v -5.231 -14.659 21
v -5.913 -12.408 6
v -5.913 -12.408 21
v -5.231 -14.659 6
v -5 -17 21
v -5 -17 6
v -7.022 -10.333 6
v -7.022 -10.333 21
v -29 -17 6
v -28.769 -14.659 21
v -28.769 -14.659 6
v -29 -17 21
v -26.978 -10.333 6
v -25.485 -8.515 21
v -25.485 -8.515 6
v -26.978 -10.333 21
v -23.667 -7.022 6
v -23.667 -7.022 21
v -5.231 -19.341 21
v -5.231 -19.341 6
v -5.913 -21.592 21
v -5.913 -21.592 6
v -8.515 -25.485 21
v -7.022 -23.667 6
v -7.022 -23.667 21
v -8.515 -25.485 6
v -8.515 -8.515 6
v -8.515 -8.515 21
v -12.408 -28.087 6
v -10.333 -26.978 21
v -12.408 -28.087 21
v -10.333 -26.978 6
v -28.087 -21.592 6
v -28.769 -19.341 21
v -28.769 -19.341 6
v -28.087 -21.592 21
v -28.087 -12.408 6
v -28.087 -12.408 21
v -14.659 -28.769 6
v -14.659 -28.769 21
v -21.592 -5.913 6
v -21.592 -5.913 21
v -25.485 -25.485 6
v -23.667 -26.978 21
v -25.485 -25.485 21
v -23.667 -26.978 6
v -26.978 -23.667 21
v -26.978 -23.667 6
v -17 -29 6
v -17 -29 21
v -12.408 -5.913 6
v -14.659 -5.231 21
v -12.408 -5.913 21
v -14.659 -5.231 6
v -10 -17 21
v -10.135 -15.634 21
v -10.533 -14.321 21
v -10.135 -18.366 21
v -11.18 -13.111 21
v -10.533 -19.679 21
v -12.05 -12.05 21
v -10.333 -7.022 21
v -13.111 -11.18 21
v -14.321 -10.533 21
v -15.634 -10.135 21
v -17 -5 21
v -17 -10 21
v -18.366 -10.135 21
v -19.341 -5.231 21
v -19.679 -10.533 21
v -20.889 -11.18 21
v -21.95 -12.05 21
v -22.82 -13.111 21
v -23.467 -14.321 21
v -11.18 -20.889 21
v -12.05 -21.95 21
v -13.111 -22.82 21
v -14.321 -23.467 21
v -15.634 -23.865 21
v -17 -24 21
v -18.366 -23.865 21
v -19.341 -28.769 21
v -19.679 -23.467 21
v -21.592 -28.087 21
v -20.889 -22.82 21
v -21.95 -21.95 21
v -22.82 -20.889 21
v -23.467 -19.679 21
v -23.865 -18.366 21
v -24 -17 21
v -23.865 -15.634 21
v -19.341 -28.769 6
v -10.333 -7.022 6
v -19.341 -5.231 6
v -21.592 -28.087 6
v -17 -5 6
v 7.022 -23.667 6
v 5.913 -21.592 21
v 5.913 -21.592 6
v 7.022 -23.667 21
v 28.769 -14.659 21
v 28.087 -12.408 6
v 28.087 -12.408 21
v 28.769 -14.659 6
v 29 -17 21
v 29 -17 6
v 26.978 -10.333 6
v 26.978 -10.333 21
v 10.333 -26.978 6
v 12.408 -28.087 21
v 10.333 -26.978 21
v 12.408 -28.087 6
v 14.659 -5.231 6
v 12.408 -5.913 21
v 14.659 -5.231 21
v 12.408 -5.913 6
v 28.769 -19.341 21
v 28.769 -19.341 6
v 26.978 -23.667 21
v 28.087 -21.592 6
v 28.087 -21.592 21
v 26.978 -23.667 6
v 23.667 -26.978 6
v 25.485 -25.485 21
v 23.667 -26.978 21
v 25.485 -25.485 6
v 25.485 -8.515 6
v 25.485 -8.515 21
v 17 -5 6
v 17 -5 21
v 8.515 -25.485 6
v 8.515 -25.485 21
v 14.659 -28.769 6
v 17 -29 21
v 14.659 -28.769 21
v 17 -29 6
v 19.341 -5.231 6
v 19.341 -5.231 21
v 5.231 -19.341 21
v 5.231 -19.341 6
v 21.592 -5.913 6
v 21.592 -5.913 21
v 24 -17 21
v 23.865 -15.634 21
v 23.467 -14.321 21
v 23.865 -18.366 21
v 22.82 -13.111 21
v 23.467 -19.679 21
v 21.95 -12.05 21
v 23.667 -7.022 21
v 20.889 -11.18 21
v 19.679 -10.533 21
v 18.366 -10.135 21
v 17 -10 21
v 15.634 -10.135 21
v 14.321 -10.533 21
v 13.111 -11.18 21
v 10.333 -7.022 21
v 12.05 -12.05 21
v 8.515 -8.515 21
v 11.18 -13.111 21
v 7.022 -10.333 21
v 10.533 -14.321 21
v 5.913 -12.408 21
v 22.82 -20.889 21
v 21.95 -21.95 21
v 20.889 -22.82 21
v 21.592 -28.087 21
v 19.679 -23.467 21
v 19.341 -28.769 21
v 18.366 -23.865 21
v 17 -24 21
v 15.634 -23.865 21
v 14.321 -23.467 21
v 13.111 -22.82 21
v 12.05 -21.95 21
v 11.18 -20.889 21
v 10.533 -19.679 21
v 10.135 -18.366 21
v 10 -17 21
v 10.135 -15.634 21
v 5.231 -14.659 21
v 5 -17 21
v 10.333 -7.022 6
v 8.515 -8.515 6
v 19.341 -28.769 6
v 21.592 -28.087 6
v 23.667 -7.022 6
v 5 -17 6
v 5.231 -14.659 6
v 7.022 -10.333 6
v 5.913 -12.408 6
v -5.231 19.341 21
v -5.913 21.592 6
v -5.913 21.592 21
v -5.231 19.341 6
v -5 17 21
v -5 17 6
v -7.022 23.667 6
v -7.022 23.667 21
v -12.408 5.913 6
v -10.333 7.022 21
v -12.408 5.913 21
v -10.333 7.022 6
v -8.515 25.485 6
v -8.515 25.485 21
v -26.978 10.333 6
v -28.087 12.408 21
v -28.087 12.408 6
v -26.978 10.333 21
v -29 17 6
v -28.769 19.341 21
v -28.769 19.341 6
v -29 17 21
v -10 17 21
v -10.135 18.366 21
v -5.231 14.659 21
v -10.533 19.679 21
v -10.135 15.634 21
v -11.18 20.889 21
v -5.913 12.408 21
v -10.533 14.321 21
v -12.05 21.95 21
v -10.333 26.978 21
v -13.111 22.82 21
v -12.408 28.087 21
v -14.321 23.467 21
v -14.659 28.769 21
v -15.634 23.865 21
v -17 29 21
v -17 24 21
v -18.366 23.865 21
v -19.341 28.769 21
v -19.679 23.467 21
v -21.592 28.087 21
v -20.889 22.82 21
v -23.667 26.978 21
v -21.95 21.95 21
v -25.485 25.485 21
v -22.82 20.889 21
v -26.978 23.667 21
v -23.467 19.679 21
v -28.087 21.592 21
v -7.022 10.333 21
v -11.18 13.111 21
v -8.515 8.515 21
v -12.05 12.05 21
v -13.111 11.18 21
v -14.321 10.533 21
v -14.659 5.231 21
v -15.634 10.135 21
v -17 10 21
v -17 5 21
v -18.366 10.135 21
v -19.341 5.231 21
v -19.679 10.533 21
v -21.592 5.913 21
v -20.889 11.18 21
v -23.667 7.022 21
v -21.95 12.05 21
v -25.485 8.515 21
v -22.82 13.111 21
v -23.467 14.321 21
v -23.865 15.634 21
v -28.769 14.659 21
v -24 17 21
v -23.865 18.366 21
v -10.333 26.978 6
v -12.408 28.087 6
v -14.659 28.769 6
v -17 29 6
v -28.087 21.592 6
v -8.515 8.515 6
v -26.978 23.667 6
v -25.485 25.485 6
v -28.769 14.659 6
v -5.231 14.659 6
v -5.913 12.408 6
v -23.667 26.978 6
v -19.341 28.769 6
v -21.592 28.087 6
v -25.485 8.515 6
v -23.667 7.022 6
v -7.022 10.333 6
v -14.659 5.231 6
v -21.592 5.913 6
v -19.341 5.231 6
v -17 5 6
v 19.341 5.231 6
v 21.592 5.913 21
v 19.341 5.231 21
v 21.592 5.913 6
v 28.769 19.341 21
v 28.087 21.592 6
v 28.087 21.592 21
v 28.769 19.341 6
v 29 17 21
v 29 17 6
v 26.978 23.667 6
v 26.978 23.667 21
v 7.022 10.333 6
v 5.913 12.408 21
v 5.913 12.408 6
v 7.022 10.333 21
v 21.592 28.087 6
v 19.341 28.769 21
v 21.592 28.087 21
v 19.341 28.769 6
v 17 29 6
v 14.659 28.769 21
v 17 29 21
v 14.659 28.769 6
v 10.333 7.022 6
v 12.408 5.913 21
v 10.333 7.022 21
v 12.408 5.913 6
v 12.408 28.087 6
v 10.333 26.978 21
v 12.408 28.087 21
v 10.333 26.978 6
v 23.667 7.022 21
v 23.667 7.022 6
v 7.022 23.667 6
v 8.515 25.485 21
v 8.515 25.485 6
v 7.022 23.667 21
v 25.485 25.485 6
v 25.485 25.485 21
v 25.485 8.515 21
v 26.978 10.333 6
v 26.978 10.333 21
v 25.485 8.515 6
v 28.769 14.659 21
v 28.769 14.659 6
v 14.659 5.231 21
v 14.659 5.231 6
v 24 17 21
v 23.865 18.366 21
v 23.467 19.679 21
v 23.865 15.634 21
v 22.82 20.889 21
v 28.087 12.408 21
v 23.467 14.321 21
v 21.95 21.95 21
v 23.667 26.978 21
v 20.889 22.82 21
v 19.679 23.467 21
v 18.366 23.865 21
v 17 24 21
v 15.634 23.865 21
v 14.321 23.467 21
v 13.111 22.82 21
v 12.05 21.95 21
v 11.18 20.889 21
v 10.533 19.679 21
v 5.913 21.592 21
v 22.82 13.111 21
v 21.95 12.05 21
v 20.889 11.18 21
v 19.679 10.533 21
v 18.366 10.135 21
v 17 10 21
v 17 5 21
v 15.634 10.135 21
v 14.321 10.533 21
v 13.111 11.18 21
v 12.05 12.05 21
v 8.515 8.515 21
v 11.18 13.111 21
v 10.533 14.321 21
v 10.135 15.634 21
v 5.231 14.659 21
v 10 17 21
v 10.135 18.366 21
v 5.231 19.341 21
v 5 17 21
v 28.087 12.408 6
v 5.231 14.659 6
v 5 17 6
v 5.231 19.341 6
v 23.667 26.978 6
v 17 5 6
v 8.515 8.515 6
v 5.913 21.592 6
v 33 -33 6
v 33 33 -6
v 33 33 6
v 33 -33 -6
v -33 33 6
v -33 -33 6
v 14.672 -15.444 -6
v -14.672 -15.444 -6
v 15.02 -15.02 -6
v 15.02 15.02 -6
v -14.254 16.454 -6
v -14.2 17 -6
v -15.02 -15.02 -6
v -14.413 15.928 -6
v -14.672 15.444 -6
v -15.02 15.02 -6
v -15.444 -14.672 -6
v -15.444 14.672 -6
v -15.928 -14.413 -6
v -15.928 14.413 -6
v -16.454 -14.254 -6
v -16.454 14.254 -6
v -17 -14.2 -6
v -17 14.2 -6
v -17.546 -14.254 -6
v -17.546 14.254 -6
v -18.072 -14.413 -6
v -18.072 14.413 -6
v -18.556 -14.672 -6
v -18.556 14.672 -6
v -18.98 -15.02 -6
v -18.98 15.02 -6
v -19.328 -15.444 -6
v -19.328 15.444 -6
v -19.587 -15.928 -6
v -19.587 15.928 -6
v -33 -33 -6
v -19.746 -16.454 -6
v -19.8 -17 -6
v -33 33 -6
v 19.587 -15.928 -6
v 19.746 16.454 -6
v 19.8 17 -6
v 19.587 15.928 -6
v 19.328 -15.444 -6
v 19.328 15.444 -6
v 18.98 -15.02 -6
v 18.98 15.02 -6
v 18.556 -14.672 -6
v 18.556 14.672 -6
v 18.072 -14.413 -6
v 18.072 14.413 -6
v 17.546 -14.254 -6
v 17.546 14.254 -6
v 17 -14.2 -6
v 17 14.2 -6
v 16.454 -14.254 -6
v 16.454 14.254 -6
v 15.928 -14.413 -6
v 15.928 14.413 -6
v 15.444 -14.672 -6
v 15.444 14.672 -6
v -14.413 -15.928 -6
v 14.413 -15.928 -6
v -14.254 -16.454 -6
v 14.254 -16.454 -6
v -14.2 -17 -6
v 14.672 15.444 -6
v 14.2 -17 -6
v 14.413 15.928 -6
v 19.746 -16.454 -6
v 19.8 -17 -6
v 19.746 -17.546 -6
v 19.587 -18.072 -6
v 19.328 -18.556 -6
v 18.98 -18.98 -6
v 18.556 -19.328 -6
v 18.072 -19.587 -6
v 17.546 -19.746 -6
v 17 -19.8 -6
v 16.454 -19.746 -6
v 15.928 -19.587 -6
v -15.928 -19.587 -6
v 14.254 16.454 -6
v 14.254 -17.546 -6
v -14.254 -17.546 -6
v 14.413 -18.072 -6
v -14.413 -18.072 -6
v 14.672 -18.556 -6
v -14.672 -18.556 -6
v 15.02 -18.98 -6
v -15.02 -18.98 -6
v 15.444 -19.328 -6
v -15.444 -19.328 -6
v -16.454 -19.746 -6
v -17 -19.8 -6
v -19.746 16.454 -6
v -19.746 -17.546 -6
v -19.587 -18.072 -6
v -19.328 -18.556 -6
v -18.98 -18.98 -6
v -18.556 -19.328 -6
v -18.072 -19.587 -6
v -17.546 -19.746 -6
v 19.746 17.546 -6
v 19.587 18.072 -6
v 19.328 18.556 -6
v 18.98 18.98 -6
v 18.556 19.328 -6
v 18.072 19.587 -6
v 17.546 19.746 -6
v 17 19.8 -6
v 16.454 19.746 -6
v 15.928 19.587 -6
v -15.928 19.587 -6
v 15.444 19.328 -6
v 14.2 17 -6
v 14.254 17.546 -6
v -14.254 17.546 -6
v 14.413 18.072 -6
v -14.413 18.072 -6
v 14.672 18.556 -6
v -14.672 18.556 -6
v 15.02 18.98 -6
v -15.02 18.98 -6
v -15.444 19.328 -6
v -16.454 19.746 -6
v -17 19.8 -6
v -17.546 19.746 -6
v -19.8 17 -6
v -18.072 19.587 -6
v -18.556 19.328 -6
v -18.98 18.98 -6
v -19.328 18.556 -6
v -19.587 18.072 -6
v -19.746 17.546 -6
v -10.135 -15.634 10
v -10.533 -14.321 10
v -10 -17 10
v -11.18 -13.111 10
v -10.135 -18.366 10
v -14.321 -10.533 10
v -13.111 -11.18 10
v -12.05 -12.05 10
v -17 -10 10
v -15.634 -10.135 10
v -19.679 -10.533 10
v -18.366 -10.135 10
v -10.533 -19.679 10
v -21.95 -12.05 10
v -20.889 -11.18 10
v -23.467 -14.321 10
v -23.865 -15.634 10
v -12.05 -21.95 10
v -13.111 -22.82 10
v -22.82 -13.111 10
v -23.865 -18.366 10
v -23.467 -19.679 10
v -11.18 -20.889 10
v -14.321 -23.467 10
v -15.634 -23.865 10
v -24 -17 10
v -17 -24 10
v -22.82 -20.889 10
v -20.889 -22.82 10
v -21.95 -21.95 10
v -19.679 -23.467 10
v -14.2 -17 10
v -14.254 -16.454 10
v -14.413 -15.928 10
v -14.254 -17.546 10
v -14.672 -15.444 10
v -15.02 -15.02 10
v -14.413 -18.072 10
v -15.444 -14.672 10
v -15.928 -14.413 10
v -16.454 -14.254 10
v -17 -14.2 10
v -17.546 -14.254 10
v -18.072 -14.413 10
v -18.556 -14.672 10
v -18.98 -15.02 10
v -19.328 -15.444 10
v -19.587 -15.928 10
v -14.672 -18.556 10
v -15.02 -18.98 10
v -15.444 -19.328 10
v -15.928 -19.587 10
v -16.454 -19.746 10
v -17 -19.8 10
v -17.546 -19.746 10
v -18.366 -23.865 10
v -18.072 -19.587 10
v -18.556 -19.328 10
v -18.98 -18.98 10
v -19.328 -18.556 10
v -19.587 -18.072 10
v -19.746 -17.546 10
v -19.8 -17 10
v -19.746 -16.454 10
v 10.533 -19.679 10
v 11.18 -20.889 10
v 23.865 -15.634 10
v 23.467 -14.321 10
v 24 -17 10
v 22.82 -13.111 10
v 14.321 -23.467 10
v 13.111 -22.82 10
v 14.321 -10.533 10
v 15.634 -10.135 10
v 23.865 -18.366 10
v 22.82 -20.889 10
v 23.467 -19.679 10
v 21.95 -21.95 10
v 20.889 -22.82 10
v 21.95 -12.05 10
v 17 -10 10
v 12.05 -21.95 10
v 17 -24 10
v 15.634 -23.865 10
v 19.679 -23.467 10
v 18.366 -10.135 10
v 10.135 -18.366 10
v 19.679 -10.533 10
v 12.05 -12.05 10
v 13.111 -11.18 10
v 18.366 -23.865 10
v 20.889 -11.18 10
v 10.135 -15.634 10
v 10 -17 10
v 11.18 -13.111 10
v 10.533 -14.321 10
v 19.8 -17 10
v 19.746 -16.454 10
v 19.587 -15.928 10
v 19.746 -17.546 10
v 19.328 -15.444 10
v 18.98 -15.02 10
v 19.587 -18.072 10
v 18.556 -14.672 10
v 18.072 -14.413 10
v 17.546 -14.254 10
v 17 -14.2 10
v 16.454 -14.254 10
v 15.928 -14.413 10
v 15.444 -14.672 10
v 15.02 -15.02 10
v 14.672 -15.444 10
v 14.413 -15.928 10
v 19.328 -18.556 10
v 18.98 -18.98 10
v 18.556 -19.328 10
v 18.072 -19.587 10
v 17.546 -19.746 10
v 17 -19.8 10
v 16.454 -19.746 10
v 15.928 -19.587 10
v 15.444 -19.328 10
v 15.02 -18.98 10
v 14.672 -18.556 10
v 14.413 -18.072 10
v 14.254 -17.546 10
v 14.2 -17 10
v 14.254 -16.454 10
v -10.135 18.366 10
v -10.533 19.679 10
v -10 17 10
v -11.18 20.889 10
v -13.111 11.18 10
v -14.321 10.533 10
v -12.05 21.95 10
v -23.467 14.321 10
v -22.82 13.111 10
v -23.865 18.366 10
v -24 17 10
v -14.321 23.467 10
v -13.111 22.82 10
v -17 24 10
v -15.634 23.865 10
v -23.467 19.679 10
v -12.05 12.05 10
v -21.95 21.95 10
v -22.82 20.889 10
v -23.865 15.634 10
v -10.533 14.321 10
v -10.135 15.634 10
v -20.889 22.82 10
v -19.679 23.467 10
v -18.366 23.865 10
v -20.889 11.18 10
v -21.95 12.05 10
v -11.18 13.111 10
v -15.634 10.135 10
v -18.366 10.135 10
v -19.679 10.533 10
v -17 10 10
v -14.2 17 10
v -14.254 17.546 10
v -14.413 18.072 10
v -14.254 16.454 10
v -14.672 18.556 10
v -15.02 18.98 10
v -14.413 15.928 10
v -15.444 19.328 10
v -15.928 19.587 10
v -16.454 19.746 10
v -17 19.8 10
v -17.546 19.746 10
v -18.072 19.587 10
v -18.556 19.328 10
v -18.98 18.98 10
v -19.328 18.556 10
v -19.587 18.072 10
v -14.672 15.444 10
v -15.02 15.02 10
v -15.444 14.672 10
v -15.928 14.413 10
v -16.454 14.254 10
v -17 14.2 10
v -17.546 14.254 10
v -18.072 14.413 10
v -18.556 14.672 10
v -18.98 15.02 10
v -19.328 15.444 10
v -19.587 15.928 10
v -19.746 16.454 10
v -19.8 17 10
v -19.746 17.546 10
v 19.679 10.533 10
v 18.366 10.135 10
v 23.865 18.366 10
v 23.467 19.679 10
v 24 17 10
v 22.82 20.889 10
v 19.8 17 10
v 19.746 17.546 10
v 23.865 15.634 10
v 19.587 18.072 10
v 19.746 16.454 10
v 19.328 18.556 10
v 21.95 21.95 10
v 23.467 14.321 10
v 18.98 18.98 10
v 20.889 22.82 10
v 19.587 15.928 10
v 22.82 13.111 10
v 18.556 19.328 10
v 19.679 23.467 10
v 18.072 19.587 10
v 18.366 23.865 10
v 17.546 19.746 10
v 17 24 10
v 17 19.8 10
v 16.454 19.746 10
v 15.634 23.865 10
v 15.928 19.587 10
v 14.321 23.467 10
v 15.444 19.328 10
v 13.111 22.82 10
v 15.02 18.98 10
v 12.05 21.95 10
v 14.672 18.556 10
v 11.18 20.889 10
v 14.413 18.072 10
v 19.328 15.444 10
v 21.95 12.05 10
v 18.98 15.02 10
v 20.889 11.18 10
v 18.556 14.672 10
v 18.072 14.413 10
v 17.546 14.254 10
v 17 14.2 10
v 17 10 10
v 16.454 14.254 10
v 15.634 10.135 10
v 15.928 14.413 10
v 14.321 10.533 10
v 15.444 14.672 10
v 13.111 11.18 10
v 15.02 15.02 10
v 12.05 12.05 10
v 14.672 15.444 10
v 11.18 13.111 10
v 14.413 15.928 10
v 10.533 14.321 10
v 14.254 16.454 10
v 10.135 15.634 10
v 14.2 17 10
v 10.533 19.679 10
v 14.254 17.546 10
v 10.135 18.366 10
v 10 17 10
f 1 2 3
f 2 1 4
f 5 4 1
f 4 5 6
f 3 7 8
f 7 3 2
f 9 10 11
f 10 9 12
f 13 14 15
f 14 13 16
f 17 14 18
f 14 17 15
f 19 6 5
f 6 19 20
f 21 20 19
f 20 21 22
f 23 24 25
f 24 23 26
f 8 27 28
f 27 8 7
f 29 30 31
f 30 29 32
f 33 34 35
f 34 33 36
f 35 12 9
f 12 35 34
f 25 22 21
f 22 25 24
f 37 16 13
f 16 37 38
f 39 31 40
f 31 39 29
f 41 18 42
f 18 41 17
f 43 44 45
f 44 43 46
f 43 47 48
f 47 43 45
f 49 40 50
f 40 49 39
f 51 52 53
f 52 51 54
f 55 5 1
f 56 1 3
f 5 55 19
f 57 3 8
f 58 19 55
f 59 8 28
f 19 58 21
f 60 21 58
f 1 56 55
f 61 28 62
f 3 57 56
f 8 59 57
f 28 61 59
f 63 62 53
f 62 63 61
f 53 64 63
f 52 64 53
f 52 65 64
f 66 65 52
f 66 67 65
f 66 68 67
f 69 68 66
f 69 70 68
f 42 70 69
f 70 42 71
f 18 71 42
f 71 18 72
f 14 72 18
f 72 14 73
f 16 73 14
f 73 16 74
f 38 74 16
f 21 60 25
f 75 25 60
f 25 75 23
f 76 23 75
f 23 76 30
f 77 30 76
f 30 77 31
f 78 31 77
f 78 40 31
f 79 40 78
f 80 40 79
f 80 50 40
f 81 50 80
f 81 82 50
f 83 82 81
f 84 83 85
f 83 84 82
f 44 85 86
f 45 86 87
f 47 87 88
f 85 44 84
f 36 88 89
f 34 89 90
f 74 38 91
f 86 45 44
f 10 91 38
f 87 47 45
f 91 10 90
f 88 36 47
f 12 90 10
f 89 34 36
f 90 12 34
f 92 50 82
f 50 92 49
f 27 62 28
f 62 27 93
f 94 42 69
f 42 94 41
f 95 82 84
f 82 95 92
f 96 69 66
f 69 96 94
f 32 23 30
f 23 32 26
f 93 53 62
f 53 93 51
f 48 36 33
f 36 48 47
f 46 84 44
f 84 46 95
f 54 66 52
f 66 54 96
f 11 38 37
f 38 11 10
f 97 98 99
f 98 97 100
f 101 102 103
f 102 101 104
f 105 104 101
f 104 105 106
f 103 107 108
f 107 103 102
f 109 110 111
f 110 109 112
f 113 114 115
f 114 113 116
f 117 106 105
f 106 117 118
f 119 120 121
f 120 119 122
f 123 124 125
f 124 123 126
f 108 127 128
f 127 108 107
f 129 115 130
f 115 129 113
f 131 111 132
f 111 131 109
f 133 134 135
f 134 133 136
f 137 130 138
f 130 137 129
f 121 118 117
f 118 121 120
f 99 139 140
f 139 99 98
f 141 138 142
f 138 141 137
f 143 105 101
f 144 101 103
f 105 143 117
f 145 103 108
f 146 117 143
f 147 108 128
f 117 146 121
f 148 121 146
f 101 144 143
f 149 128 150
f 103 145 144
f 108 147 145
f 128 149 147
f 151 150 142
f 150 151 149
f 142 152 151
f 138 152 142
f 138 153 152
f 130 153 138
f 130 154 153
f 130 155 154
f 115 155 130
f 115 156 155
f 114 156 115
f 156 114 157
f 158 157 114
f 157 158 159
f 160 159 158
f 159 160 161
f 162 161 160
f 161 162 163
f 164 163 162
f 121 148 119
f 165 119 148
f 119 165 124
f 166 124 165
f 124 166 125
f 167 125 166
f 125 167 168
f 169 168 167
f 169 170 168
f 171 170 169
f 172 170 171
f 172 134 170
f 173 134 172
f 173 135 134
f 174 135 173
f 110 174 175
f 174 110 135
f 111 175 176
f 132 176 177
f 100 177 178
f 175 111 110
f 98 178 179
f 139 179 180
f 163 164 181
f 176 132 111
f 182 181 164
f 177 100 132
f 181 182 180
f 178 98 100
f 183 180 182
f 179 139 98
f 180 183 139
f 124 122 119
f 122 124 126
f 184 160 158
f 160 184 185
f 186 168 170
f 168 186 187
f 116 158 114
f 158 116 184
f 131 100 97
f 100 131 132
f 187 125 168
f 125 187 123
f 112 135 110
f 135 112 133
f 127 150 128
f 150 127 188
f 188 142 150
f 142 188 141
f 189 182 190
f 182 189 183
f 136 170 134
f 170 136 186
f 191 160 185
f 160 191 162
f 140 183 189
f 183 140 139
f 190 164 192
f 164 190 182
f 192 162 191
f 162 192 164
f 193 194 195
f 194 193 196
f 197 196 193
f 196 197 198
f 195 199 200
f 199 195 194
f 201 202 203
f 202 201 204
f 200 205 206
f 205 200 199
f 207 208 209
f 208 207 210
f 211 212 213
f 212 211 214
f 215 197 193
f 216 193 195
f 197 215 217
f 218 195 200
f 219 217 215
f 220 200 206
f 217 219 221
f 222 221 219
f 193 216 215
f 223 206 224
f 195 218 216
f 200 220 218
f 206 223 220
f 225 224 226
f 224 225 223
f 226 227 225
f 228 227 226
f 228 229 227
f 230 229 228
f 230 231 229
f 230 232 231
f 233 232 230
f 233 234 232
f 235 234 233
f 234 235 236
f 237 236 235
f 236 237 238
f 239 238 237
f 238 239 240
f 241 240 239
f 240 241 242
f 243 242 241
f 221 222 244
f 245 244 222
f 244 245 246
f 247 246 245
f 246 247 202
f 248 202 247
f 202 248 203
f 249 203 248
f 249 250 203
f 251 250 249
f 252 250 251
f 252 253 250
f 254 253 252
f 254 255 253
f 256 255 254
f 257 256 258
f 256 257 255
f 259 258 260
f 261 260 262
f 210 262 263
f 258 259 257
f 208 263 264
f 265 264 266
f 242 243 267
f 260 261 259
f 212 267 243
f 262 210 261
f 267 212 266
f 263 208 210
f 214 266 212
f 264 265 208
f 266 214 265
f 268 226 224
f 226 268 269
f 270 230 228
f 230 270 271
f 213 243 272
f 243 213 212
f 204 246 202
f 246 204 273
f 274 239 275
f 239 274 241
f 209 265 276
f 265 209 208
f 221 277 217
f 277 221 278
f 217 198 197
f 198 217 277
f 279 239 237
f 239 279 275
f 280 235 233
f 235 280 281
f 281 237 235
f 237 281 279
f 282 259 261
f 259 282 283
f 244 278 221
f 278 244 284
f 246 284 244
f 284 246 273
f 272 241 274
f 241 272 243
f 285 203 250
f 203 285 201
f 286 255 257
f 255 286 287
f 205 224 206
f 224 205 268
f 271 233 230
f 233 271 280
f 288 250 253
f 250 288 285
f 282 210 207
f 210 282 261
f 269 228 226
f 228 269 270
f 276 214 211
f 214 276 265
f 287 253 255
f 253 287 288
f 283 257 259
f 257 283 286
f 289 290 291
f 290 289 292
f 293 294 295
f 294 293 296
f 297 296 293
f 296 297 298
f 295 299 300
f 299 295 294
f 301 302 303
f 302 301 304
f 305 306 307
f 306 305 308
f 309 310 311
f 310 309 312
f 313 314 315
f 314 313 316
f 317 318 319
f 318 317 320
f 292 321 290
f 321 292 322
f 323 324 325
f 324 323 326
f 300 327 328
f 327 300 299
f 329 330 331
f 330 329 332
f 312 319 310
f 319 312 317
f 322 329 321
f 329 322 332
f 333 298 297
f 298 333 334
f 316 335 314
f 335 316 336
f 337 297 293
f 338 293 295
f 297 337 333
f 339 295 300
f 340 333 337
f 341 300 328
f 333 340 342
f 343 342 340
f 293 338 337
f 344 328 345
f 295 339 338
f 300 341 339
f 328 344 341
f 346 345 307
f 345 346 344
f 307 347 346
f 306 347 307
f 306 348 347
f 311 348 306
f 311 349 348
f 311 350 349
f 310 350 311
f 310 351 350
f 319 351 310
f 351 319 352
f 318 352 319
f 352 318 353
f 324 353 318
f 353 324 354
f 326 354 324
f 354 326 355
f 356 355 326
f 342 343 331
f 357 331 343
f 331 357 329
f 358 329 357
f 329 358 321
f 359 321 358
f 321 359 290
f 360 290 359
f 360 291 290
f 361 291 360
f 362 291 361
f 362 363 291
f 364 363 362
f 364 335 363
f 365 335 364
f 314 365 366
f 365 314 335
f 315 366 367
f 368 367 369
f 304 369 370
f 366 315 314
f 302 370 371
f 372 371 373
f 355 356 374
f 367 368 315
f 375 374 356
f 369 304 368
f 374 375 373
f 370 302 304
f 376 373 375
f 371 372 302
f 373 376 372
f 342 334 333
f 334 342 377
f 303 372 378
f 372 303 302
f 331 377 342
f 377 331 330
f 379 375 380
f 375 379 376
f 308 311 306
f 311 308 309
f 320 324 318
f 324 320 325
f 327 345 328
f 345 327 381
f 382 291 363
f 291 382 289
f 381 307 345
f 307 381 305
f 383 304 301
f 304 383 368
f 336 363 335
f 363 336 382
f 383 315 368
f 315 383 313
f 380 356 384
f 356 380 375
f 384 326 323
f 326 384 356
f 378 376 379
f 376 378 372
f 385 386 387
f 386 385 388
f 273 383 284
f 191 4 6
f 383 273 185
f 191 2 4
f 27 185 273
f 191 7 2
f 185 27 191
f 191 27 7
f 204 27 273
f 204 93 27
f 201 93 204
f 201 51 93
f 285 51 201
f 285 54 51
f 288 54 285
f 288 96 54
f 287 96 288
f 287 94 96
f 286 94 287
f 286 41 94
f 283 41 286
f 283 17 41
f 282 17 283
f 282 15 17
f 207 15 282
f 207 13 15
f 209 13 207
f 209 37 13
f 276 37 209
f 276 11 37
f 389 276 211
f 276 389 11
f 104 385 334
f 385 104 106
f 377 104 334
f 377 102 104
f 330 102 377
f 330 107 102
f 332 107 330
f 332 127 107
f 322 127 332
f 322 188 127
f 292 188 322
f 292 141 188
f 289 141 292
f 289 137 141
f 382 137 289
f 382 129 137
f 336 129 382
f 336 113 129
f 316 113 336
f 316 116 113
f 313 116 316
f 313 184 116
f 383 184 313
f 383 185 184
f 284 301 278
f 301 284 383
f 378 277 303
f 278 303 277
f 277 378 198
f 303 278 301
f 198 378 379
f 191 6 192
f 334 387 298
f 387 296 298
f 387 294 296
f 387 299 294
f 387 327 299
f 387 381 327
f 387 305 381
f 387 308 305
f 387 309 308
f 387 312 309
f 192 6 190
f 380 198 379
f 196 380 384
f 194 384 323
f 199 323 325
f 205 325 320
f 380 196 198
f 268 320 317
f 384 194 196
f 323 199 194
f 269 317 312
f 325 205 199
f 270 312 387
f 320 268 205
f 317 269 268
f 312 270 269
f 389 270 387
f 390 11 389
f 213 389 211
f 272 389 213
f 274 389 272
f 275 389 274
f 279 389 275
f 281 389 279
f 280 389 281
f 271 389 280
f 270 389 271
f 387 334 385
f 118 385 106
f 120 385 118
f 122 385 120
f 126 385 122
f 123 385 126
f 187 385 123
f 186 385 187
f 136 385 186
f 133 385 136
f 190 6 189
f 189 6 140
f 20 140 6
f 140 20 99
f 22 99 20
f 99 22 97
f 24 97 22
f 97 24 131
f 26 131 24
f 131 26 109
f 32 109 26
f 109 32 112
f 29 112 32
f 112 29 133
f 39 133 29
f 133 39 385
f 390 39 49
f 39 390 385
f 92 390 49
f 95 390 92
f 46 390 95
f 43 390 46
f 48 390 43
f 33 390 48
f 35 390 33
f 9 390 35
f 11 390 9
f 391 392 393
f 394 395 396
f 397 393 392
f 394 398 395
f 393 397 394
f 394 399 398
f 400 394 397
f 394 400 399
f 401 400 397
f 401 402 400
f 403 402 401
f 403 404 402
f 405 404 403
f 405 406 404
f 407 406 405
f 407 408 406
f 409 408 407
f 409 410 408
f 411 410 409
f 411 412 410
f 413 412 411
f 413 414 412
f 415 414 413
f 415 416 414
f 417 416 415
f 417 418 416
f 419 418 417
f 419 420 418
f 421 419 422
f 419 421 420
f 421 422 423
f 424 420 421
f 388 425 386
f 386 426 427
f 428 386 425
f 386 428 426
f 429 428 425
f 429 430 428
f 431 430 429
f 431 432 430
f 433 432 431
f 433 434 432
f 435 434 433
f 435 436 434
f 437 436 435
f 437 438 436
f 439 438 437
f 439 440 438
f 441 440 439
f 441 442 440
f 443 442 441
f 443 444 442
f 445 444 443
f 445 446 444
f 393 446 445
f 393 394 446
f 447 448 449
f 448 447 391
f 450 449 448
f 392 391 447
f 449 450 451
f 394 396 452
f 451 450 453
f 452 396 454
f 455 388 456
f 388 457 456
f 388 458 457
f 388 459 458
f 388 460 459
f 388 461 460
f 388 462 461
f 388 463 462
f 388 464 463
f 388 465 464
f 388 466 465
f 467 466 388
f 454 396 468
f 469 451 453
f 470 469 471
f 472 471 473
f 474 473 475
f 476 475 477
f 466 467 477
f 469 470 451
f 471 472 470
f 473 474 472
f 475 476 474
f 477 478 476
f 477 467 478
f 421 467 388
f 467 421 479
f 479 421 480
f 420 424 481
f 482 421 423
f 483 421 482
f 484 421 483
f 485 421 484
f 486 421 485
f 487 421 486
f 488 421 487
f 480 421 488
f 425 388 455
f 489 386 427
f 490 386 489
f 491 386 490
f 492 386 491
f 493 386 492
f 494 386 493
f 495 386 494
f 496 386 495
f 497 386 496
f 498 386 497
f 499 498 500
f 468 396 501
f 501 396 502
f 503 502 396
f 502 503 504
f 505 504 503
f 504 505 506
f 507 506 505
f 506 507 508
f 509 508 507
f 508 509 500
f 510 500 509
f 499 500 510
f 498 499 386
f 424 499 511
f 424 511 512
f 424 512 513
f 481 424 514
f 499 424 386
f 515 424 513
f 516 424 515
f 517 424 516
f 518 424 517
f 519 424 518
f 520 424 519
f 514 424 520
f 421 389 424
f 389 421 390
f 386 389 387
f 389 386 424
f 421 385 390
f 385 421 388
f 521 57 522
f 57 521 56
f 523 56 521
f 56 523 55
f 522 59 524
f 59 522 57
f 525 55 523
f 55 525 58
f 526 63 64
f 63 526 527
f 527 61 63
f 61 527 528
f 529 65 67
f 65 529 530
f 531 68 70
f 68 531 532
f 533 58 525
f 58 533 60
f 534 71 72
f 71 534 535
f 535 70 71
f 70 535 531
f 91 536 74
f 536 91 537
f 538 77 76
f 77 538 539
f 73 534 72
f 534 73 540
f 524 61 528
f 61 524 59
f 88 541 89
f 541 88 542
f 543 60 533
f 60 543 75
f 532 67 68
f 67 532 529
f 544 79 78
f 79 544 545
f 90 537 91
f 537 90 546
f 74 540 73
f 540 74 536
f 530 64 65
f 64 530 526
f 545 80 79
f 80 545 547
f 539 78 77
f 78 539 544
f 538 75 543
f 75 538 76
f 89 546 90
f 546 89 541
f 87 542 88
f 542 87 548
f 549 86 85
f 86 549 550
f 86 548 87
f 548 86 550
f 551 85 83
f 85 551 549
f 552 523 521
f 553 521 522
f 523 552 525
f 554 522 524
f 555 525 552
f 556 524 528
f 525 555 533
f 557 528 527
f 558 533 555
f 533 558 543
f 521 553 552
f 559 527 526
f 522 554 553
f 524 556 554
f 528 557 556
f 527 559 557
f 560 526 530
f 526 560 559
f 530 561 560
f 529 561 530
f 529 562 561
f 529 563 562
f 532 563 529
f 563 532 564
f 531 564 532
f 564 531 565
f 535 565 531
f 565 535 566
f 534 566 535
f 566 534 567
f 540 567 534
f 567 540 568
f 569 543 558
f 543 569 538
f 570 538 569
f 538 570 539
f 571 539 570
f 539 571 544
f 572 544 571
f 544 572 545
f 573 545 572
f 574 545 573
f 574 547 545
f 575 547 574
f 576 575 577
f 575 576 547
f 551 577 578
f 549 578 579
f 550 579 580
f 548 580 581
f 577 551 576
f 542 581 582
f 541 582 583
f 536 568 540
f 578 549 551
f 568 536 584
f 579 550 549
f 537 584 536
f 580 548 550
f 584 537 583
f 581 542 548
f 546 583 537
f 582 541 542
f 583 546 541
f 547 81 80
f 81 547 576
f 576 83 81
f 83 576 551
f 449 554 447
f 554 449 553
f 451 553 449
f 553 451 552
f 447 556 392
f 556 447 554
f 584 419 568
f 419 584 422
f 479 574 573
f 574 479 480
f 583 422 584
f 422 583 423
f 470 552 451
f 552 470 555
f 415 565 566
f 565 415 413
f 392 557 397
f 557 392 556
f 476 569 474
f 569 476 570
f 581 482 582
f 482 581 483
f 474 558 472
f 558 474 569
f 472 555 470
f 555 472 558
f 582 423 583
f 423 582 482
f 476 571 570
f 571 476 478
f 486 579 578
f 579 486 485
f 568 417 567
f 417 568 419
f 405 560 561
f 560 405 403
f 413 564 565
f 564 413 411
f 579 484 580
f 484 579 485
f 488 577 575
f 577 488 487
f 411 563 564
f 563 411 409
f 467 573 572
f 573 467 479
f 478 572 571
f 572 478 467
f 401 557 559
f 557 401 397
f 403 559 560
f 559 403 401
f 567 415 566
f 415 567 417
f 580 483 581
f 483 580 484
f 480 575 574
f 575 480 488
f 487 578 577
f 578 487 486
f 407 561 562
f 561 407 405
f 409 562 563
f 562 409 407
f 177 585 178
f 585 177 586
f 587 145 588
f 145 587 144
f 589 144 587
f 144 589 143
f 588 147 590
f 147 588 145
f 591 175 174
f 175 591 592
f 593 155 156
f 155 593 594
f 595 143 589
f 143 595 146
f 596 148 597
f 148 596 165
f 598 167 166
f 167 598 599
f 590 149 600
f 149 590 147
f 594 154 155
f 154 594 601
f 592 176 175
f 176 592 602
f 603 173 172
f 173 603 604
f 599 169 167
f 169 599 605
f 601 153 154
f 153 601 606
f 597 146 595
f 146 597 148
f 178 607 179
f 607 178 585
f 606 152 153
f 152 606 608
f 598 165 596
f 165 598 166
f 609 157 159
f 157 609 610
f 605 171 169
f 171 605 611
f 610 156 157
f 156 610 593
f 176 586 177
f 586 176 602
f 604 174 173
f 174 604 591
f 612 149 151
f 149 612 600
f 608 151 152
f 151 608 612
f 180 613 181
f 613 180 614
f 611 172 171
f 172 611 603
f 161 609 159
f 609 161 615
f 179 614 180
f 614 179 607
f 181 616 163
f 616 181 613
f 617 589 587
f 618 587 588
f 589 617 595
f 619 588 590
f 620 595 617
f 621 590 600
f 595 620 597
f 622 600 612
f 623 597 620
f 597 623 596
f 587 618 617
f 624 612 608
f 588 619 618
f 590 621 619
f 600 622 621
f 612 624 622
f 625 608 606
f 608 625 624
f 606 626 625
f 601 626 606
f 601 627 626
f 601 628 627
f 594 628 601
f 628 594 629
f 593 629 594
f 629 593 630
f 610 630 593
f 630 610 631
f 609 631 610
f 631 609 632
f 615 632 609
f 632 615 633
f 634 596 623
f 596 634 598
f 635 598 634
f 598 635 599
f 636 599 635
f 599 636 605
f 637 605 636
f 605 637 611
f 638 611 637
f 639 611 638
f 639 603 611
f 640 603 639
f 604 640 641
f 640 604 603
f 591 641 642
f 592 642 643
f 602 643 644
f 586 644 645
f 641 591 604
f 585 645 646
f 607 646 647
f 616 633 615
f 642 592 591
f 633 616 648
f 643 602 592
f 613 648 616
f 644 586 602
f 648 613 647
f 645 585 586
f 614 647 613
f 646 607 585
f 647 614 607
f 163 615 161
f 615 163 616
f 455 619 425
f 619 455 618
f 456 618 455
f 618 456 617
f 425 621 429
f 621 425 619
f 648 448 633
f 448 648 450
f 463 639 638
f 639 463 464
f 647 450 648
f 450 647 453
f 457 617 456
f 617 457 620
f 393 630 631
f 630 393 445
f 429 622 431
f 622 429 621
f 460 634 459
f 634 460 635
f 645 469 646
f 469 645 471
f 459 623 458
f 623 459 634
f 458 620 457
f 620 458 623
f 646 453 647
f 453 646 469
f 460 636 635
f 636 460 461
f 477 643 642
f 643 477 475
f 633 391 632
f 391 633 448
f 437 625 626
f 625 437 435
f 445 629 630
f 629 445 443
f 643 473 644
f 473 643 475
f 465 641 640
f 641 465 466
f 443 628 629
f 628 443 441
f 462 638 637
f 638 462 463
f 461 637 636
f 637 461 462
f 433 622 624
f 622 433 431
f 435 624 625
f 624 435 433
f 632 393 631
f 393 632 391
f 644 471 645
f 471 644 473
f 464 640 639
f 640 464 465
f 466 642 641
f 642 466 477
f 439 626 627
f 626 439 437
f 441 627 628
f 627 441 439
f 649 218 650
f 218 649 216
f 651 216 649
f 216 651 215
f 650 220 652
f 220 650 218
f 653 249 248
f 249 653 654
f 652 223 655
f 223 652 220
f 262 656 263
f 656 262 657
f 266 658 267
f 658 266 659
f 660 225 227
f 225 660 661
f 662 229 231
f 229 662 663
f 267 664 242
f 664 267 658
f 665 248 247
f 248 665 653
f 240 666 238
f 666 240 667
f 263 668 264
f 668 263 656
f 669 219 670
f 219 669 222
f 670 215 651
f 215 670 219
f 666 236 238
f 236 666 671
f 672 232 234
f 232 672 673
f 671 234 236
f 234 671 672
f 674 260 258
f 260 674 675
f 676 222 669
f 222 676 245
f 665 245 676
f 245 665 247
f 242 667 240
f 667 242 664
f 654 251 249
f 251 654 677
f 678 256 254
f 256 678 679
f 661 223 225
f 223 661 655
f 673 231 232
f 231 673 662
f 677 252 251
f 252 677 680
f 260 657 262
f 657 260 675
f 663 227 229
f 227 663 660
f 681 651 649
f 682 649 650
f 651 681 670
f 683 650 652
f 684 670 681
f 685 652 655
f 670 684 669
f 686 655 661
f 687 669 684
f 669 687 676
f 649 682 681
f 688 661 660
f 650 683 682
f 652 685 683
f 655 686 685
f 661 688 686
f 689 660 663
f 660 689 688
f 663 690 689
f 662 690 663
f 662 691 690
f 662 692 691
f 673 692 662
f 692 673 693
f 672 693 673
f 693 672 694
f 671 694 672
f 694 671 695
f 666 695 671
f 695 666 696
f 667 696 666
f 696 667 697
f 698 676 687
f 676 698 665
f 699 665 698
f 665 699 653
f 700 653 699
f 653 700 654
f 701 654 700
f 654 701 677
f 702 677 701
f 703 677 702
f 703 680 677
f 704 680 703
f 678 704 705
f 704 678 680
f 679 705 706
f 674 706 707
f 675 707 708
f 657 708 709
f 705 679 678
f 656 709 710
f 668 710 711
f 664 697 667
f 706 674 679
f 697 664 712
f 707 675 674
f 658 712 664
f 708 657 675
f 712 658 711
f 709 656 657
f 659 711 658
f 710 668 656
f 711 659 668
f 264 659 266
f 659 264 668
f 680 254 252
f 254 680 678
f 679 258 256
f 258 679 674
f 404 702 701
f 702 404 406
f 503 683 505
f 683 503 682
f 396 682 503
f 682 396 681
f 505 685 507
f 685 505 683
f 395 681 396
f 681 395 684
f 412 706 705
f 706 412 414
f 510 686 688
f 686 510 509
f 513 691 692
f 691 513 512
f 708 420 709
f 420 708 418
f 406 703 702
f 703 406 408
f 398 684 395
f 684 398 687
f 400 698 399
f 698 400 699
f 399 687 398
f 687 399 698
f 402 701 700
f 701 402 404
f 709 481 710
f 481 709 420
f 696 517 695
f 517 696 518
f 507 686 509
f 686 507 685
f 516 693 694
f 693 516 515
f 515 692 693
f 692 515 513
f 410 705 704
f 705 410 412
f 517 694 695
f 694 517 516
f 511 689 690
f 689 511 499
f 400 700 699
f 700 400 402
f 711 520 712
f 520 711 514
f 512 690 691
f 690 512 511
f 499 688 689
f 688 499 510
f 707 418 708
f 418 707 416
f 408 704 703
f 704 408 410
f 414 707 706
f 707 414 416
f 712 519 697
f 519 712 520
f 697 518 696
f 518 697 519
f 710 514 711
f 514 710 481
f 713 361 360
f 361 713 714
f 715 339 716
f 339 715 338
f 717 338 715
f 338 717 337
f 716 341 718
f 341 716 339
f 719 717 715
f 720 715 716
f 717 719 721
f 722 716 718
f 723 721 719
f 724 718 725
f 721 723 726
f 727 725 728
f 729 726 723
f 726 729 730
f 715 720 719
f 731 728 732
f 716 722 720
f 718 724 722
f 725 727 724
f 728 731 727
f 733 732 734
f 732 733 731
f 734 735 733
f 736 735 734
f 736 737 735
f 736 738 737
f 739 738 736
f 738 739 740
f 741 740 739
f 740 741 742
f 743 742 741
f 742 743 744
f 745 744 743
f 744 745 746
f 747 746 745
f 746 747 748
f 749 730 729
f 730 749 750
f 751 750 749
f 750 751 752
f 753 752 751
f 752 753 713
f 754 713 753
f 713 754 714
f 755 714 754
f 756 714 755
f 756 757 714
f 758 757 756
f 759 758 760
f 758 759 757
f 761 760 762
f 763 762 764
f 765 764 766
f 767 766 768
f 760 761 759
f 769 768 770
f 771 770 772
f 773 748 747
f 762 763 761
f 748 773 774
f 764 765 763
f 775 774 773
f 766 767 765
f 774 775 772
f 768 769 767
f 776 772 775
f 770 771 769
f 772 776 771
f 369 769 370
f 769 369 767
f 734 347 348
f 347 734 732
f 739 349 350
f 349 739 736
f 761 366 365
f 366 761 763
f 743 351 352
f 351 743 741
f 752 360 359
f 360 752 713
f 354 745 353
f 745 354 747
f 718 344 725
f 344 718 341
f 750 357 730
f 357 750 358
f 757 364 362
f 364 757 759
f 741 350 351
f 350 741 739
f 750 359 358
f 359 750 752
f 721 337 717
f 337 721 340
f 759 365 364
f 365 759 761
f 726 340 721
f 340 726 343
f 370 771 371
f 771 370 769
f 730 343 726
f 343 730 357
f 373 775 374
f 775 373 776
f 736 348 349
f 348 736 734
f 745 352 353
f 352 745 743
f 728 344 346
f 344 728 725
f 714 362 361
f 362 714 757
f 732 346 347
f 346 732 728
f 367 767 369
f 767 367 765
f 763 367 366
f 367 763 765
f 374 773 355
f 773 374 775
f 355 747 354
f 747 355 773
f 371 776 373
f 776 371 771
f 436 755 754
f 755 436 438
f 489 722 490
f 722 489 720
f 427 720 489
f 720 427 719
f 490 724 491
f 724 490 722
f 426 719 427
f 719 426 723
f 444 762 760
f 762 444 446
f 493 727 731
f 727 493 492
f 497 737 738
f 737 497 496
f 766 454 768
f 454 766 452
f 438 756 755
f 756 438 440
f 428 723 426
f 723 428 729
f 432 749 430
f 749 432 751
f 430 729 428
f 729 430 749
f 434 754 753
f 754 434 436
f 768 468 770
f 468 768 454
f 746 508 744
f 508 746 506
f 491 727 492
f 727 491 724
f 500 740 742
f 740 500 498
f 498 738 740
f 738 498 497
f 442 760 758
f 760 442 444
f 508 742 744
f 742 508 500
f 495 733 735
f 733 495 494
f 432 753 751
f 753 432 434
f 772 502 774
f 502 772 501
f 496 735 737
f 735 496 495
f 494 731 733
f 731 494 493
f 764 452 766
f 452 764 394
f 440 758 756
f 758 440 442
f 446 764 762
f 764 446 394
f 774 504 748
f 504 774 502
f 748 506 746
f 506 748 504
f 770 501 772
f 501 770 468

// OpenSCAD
$fn = 32;

// ----------------------------------------------------------------------
// Socket pad plate
// bosses with counterbored sockets for the screws
// ----------------------------------------------------------------------

// --- parameters (mm) ---
base_t = 12;        // base plate thickness
boss_h = 15;        // boss height above the base plate
boss_d = 24;        // boss diameter
socket_d = 14;      // socket diameter
socket_depth = 11;  // socket depth from the boss face
bolt_d = 5.6;       // screw clearance hole through the socket floor
rows = 2;           // boss rows
cols = 2;           // bosses per row
pitch = 34;         // boss pitch

// --- derived feature positions (mm) ---
height = base_t + boss_h;           // = 27   overall height of the part
plate = [pitch * (cols - 1) + boss_d + 8, pitch * (rows - 1) + boss_d + 8, base_t];  // = [66, 66, 12]   overall size (x, y, z)
span_x = pitch * (cols - 1);        // = 34   distance between outer bosses
span_y = pitch * (rows - 1);        // = 34   distance between boss rows
origin_x = -span_x / 2;             // = -17   X of the first boss
origin_y = -span_y / 2;             // = -17   Y of the first boss
feature_centers = [
  [origin_x + 0 * pitch, origin_y + 0 * pitch],
  [origin_x + 1 * pitch, origin_y + 0 * pitch],
  [origin_x + 0 * pitch, origin_y + 1 * pitch],
  [origin_x + 1 * pitch, origin_y + 1 * pitch]
];   // boss centres: sockets, holes and the pads themselves are placed from here

// base plate, bosses on feature_centers, socket + through hole in each
difference() {
  union() {
    cube(plate, center = true);
    for (centre = feature_centers)
      translate([centre[0], centre[1], plate[2] / 2 - 1])
        cylinder(d = boss_d, h = boss_h + 1);
  }
  for (centre = feature_centers) {
    translate([centre[0], centre[1], plate[2] / 2 + boss_h - socket_depth])
      cylinder(d = socket_d, h = socket_depth + 1);
    translate([centre[0], centre[1], -height])
      cylinder(d = bolt_d, h = 2 * height + 2);  // through the socket floor
  }
}
